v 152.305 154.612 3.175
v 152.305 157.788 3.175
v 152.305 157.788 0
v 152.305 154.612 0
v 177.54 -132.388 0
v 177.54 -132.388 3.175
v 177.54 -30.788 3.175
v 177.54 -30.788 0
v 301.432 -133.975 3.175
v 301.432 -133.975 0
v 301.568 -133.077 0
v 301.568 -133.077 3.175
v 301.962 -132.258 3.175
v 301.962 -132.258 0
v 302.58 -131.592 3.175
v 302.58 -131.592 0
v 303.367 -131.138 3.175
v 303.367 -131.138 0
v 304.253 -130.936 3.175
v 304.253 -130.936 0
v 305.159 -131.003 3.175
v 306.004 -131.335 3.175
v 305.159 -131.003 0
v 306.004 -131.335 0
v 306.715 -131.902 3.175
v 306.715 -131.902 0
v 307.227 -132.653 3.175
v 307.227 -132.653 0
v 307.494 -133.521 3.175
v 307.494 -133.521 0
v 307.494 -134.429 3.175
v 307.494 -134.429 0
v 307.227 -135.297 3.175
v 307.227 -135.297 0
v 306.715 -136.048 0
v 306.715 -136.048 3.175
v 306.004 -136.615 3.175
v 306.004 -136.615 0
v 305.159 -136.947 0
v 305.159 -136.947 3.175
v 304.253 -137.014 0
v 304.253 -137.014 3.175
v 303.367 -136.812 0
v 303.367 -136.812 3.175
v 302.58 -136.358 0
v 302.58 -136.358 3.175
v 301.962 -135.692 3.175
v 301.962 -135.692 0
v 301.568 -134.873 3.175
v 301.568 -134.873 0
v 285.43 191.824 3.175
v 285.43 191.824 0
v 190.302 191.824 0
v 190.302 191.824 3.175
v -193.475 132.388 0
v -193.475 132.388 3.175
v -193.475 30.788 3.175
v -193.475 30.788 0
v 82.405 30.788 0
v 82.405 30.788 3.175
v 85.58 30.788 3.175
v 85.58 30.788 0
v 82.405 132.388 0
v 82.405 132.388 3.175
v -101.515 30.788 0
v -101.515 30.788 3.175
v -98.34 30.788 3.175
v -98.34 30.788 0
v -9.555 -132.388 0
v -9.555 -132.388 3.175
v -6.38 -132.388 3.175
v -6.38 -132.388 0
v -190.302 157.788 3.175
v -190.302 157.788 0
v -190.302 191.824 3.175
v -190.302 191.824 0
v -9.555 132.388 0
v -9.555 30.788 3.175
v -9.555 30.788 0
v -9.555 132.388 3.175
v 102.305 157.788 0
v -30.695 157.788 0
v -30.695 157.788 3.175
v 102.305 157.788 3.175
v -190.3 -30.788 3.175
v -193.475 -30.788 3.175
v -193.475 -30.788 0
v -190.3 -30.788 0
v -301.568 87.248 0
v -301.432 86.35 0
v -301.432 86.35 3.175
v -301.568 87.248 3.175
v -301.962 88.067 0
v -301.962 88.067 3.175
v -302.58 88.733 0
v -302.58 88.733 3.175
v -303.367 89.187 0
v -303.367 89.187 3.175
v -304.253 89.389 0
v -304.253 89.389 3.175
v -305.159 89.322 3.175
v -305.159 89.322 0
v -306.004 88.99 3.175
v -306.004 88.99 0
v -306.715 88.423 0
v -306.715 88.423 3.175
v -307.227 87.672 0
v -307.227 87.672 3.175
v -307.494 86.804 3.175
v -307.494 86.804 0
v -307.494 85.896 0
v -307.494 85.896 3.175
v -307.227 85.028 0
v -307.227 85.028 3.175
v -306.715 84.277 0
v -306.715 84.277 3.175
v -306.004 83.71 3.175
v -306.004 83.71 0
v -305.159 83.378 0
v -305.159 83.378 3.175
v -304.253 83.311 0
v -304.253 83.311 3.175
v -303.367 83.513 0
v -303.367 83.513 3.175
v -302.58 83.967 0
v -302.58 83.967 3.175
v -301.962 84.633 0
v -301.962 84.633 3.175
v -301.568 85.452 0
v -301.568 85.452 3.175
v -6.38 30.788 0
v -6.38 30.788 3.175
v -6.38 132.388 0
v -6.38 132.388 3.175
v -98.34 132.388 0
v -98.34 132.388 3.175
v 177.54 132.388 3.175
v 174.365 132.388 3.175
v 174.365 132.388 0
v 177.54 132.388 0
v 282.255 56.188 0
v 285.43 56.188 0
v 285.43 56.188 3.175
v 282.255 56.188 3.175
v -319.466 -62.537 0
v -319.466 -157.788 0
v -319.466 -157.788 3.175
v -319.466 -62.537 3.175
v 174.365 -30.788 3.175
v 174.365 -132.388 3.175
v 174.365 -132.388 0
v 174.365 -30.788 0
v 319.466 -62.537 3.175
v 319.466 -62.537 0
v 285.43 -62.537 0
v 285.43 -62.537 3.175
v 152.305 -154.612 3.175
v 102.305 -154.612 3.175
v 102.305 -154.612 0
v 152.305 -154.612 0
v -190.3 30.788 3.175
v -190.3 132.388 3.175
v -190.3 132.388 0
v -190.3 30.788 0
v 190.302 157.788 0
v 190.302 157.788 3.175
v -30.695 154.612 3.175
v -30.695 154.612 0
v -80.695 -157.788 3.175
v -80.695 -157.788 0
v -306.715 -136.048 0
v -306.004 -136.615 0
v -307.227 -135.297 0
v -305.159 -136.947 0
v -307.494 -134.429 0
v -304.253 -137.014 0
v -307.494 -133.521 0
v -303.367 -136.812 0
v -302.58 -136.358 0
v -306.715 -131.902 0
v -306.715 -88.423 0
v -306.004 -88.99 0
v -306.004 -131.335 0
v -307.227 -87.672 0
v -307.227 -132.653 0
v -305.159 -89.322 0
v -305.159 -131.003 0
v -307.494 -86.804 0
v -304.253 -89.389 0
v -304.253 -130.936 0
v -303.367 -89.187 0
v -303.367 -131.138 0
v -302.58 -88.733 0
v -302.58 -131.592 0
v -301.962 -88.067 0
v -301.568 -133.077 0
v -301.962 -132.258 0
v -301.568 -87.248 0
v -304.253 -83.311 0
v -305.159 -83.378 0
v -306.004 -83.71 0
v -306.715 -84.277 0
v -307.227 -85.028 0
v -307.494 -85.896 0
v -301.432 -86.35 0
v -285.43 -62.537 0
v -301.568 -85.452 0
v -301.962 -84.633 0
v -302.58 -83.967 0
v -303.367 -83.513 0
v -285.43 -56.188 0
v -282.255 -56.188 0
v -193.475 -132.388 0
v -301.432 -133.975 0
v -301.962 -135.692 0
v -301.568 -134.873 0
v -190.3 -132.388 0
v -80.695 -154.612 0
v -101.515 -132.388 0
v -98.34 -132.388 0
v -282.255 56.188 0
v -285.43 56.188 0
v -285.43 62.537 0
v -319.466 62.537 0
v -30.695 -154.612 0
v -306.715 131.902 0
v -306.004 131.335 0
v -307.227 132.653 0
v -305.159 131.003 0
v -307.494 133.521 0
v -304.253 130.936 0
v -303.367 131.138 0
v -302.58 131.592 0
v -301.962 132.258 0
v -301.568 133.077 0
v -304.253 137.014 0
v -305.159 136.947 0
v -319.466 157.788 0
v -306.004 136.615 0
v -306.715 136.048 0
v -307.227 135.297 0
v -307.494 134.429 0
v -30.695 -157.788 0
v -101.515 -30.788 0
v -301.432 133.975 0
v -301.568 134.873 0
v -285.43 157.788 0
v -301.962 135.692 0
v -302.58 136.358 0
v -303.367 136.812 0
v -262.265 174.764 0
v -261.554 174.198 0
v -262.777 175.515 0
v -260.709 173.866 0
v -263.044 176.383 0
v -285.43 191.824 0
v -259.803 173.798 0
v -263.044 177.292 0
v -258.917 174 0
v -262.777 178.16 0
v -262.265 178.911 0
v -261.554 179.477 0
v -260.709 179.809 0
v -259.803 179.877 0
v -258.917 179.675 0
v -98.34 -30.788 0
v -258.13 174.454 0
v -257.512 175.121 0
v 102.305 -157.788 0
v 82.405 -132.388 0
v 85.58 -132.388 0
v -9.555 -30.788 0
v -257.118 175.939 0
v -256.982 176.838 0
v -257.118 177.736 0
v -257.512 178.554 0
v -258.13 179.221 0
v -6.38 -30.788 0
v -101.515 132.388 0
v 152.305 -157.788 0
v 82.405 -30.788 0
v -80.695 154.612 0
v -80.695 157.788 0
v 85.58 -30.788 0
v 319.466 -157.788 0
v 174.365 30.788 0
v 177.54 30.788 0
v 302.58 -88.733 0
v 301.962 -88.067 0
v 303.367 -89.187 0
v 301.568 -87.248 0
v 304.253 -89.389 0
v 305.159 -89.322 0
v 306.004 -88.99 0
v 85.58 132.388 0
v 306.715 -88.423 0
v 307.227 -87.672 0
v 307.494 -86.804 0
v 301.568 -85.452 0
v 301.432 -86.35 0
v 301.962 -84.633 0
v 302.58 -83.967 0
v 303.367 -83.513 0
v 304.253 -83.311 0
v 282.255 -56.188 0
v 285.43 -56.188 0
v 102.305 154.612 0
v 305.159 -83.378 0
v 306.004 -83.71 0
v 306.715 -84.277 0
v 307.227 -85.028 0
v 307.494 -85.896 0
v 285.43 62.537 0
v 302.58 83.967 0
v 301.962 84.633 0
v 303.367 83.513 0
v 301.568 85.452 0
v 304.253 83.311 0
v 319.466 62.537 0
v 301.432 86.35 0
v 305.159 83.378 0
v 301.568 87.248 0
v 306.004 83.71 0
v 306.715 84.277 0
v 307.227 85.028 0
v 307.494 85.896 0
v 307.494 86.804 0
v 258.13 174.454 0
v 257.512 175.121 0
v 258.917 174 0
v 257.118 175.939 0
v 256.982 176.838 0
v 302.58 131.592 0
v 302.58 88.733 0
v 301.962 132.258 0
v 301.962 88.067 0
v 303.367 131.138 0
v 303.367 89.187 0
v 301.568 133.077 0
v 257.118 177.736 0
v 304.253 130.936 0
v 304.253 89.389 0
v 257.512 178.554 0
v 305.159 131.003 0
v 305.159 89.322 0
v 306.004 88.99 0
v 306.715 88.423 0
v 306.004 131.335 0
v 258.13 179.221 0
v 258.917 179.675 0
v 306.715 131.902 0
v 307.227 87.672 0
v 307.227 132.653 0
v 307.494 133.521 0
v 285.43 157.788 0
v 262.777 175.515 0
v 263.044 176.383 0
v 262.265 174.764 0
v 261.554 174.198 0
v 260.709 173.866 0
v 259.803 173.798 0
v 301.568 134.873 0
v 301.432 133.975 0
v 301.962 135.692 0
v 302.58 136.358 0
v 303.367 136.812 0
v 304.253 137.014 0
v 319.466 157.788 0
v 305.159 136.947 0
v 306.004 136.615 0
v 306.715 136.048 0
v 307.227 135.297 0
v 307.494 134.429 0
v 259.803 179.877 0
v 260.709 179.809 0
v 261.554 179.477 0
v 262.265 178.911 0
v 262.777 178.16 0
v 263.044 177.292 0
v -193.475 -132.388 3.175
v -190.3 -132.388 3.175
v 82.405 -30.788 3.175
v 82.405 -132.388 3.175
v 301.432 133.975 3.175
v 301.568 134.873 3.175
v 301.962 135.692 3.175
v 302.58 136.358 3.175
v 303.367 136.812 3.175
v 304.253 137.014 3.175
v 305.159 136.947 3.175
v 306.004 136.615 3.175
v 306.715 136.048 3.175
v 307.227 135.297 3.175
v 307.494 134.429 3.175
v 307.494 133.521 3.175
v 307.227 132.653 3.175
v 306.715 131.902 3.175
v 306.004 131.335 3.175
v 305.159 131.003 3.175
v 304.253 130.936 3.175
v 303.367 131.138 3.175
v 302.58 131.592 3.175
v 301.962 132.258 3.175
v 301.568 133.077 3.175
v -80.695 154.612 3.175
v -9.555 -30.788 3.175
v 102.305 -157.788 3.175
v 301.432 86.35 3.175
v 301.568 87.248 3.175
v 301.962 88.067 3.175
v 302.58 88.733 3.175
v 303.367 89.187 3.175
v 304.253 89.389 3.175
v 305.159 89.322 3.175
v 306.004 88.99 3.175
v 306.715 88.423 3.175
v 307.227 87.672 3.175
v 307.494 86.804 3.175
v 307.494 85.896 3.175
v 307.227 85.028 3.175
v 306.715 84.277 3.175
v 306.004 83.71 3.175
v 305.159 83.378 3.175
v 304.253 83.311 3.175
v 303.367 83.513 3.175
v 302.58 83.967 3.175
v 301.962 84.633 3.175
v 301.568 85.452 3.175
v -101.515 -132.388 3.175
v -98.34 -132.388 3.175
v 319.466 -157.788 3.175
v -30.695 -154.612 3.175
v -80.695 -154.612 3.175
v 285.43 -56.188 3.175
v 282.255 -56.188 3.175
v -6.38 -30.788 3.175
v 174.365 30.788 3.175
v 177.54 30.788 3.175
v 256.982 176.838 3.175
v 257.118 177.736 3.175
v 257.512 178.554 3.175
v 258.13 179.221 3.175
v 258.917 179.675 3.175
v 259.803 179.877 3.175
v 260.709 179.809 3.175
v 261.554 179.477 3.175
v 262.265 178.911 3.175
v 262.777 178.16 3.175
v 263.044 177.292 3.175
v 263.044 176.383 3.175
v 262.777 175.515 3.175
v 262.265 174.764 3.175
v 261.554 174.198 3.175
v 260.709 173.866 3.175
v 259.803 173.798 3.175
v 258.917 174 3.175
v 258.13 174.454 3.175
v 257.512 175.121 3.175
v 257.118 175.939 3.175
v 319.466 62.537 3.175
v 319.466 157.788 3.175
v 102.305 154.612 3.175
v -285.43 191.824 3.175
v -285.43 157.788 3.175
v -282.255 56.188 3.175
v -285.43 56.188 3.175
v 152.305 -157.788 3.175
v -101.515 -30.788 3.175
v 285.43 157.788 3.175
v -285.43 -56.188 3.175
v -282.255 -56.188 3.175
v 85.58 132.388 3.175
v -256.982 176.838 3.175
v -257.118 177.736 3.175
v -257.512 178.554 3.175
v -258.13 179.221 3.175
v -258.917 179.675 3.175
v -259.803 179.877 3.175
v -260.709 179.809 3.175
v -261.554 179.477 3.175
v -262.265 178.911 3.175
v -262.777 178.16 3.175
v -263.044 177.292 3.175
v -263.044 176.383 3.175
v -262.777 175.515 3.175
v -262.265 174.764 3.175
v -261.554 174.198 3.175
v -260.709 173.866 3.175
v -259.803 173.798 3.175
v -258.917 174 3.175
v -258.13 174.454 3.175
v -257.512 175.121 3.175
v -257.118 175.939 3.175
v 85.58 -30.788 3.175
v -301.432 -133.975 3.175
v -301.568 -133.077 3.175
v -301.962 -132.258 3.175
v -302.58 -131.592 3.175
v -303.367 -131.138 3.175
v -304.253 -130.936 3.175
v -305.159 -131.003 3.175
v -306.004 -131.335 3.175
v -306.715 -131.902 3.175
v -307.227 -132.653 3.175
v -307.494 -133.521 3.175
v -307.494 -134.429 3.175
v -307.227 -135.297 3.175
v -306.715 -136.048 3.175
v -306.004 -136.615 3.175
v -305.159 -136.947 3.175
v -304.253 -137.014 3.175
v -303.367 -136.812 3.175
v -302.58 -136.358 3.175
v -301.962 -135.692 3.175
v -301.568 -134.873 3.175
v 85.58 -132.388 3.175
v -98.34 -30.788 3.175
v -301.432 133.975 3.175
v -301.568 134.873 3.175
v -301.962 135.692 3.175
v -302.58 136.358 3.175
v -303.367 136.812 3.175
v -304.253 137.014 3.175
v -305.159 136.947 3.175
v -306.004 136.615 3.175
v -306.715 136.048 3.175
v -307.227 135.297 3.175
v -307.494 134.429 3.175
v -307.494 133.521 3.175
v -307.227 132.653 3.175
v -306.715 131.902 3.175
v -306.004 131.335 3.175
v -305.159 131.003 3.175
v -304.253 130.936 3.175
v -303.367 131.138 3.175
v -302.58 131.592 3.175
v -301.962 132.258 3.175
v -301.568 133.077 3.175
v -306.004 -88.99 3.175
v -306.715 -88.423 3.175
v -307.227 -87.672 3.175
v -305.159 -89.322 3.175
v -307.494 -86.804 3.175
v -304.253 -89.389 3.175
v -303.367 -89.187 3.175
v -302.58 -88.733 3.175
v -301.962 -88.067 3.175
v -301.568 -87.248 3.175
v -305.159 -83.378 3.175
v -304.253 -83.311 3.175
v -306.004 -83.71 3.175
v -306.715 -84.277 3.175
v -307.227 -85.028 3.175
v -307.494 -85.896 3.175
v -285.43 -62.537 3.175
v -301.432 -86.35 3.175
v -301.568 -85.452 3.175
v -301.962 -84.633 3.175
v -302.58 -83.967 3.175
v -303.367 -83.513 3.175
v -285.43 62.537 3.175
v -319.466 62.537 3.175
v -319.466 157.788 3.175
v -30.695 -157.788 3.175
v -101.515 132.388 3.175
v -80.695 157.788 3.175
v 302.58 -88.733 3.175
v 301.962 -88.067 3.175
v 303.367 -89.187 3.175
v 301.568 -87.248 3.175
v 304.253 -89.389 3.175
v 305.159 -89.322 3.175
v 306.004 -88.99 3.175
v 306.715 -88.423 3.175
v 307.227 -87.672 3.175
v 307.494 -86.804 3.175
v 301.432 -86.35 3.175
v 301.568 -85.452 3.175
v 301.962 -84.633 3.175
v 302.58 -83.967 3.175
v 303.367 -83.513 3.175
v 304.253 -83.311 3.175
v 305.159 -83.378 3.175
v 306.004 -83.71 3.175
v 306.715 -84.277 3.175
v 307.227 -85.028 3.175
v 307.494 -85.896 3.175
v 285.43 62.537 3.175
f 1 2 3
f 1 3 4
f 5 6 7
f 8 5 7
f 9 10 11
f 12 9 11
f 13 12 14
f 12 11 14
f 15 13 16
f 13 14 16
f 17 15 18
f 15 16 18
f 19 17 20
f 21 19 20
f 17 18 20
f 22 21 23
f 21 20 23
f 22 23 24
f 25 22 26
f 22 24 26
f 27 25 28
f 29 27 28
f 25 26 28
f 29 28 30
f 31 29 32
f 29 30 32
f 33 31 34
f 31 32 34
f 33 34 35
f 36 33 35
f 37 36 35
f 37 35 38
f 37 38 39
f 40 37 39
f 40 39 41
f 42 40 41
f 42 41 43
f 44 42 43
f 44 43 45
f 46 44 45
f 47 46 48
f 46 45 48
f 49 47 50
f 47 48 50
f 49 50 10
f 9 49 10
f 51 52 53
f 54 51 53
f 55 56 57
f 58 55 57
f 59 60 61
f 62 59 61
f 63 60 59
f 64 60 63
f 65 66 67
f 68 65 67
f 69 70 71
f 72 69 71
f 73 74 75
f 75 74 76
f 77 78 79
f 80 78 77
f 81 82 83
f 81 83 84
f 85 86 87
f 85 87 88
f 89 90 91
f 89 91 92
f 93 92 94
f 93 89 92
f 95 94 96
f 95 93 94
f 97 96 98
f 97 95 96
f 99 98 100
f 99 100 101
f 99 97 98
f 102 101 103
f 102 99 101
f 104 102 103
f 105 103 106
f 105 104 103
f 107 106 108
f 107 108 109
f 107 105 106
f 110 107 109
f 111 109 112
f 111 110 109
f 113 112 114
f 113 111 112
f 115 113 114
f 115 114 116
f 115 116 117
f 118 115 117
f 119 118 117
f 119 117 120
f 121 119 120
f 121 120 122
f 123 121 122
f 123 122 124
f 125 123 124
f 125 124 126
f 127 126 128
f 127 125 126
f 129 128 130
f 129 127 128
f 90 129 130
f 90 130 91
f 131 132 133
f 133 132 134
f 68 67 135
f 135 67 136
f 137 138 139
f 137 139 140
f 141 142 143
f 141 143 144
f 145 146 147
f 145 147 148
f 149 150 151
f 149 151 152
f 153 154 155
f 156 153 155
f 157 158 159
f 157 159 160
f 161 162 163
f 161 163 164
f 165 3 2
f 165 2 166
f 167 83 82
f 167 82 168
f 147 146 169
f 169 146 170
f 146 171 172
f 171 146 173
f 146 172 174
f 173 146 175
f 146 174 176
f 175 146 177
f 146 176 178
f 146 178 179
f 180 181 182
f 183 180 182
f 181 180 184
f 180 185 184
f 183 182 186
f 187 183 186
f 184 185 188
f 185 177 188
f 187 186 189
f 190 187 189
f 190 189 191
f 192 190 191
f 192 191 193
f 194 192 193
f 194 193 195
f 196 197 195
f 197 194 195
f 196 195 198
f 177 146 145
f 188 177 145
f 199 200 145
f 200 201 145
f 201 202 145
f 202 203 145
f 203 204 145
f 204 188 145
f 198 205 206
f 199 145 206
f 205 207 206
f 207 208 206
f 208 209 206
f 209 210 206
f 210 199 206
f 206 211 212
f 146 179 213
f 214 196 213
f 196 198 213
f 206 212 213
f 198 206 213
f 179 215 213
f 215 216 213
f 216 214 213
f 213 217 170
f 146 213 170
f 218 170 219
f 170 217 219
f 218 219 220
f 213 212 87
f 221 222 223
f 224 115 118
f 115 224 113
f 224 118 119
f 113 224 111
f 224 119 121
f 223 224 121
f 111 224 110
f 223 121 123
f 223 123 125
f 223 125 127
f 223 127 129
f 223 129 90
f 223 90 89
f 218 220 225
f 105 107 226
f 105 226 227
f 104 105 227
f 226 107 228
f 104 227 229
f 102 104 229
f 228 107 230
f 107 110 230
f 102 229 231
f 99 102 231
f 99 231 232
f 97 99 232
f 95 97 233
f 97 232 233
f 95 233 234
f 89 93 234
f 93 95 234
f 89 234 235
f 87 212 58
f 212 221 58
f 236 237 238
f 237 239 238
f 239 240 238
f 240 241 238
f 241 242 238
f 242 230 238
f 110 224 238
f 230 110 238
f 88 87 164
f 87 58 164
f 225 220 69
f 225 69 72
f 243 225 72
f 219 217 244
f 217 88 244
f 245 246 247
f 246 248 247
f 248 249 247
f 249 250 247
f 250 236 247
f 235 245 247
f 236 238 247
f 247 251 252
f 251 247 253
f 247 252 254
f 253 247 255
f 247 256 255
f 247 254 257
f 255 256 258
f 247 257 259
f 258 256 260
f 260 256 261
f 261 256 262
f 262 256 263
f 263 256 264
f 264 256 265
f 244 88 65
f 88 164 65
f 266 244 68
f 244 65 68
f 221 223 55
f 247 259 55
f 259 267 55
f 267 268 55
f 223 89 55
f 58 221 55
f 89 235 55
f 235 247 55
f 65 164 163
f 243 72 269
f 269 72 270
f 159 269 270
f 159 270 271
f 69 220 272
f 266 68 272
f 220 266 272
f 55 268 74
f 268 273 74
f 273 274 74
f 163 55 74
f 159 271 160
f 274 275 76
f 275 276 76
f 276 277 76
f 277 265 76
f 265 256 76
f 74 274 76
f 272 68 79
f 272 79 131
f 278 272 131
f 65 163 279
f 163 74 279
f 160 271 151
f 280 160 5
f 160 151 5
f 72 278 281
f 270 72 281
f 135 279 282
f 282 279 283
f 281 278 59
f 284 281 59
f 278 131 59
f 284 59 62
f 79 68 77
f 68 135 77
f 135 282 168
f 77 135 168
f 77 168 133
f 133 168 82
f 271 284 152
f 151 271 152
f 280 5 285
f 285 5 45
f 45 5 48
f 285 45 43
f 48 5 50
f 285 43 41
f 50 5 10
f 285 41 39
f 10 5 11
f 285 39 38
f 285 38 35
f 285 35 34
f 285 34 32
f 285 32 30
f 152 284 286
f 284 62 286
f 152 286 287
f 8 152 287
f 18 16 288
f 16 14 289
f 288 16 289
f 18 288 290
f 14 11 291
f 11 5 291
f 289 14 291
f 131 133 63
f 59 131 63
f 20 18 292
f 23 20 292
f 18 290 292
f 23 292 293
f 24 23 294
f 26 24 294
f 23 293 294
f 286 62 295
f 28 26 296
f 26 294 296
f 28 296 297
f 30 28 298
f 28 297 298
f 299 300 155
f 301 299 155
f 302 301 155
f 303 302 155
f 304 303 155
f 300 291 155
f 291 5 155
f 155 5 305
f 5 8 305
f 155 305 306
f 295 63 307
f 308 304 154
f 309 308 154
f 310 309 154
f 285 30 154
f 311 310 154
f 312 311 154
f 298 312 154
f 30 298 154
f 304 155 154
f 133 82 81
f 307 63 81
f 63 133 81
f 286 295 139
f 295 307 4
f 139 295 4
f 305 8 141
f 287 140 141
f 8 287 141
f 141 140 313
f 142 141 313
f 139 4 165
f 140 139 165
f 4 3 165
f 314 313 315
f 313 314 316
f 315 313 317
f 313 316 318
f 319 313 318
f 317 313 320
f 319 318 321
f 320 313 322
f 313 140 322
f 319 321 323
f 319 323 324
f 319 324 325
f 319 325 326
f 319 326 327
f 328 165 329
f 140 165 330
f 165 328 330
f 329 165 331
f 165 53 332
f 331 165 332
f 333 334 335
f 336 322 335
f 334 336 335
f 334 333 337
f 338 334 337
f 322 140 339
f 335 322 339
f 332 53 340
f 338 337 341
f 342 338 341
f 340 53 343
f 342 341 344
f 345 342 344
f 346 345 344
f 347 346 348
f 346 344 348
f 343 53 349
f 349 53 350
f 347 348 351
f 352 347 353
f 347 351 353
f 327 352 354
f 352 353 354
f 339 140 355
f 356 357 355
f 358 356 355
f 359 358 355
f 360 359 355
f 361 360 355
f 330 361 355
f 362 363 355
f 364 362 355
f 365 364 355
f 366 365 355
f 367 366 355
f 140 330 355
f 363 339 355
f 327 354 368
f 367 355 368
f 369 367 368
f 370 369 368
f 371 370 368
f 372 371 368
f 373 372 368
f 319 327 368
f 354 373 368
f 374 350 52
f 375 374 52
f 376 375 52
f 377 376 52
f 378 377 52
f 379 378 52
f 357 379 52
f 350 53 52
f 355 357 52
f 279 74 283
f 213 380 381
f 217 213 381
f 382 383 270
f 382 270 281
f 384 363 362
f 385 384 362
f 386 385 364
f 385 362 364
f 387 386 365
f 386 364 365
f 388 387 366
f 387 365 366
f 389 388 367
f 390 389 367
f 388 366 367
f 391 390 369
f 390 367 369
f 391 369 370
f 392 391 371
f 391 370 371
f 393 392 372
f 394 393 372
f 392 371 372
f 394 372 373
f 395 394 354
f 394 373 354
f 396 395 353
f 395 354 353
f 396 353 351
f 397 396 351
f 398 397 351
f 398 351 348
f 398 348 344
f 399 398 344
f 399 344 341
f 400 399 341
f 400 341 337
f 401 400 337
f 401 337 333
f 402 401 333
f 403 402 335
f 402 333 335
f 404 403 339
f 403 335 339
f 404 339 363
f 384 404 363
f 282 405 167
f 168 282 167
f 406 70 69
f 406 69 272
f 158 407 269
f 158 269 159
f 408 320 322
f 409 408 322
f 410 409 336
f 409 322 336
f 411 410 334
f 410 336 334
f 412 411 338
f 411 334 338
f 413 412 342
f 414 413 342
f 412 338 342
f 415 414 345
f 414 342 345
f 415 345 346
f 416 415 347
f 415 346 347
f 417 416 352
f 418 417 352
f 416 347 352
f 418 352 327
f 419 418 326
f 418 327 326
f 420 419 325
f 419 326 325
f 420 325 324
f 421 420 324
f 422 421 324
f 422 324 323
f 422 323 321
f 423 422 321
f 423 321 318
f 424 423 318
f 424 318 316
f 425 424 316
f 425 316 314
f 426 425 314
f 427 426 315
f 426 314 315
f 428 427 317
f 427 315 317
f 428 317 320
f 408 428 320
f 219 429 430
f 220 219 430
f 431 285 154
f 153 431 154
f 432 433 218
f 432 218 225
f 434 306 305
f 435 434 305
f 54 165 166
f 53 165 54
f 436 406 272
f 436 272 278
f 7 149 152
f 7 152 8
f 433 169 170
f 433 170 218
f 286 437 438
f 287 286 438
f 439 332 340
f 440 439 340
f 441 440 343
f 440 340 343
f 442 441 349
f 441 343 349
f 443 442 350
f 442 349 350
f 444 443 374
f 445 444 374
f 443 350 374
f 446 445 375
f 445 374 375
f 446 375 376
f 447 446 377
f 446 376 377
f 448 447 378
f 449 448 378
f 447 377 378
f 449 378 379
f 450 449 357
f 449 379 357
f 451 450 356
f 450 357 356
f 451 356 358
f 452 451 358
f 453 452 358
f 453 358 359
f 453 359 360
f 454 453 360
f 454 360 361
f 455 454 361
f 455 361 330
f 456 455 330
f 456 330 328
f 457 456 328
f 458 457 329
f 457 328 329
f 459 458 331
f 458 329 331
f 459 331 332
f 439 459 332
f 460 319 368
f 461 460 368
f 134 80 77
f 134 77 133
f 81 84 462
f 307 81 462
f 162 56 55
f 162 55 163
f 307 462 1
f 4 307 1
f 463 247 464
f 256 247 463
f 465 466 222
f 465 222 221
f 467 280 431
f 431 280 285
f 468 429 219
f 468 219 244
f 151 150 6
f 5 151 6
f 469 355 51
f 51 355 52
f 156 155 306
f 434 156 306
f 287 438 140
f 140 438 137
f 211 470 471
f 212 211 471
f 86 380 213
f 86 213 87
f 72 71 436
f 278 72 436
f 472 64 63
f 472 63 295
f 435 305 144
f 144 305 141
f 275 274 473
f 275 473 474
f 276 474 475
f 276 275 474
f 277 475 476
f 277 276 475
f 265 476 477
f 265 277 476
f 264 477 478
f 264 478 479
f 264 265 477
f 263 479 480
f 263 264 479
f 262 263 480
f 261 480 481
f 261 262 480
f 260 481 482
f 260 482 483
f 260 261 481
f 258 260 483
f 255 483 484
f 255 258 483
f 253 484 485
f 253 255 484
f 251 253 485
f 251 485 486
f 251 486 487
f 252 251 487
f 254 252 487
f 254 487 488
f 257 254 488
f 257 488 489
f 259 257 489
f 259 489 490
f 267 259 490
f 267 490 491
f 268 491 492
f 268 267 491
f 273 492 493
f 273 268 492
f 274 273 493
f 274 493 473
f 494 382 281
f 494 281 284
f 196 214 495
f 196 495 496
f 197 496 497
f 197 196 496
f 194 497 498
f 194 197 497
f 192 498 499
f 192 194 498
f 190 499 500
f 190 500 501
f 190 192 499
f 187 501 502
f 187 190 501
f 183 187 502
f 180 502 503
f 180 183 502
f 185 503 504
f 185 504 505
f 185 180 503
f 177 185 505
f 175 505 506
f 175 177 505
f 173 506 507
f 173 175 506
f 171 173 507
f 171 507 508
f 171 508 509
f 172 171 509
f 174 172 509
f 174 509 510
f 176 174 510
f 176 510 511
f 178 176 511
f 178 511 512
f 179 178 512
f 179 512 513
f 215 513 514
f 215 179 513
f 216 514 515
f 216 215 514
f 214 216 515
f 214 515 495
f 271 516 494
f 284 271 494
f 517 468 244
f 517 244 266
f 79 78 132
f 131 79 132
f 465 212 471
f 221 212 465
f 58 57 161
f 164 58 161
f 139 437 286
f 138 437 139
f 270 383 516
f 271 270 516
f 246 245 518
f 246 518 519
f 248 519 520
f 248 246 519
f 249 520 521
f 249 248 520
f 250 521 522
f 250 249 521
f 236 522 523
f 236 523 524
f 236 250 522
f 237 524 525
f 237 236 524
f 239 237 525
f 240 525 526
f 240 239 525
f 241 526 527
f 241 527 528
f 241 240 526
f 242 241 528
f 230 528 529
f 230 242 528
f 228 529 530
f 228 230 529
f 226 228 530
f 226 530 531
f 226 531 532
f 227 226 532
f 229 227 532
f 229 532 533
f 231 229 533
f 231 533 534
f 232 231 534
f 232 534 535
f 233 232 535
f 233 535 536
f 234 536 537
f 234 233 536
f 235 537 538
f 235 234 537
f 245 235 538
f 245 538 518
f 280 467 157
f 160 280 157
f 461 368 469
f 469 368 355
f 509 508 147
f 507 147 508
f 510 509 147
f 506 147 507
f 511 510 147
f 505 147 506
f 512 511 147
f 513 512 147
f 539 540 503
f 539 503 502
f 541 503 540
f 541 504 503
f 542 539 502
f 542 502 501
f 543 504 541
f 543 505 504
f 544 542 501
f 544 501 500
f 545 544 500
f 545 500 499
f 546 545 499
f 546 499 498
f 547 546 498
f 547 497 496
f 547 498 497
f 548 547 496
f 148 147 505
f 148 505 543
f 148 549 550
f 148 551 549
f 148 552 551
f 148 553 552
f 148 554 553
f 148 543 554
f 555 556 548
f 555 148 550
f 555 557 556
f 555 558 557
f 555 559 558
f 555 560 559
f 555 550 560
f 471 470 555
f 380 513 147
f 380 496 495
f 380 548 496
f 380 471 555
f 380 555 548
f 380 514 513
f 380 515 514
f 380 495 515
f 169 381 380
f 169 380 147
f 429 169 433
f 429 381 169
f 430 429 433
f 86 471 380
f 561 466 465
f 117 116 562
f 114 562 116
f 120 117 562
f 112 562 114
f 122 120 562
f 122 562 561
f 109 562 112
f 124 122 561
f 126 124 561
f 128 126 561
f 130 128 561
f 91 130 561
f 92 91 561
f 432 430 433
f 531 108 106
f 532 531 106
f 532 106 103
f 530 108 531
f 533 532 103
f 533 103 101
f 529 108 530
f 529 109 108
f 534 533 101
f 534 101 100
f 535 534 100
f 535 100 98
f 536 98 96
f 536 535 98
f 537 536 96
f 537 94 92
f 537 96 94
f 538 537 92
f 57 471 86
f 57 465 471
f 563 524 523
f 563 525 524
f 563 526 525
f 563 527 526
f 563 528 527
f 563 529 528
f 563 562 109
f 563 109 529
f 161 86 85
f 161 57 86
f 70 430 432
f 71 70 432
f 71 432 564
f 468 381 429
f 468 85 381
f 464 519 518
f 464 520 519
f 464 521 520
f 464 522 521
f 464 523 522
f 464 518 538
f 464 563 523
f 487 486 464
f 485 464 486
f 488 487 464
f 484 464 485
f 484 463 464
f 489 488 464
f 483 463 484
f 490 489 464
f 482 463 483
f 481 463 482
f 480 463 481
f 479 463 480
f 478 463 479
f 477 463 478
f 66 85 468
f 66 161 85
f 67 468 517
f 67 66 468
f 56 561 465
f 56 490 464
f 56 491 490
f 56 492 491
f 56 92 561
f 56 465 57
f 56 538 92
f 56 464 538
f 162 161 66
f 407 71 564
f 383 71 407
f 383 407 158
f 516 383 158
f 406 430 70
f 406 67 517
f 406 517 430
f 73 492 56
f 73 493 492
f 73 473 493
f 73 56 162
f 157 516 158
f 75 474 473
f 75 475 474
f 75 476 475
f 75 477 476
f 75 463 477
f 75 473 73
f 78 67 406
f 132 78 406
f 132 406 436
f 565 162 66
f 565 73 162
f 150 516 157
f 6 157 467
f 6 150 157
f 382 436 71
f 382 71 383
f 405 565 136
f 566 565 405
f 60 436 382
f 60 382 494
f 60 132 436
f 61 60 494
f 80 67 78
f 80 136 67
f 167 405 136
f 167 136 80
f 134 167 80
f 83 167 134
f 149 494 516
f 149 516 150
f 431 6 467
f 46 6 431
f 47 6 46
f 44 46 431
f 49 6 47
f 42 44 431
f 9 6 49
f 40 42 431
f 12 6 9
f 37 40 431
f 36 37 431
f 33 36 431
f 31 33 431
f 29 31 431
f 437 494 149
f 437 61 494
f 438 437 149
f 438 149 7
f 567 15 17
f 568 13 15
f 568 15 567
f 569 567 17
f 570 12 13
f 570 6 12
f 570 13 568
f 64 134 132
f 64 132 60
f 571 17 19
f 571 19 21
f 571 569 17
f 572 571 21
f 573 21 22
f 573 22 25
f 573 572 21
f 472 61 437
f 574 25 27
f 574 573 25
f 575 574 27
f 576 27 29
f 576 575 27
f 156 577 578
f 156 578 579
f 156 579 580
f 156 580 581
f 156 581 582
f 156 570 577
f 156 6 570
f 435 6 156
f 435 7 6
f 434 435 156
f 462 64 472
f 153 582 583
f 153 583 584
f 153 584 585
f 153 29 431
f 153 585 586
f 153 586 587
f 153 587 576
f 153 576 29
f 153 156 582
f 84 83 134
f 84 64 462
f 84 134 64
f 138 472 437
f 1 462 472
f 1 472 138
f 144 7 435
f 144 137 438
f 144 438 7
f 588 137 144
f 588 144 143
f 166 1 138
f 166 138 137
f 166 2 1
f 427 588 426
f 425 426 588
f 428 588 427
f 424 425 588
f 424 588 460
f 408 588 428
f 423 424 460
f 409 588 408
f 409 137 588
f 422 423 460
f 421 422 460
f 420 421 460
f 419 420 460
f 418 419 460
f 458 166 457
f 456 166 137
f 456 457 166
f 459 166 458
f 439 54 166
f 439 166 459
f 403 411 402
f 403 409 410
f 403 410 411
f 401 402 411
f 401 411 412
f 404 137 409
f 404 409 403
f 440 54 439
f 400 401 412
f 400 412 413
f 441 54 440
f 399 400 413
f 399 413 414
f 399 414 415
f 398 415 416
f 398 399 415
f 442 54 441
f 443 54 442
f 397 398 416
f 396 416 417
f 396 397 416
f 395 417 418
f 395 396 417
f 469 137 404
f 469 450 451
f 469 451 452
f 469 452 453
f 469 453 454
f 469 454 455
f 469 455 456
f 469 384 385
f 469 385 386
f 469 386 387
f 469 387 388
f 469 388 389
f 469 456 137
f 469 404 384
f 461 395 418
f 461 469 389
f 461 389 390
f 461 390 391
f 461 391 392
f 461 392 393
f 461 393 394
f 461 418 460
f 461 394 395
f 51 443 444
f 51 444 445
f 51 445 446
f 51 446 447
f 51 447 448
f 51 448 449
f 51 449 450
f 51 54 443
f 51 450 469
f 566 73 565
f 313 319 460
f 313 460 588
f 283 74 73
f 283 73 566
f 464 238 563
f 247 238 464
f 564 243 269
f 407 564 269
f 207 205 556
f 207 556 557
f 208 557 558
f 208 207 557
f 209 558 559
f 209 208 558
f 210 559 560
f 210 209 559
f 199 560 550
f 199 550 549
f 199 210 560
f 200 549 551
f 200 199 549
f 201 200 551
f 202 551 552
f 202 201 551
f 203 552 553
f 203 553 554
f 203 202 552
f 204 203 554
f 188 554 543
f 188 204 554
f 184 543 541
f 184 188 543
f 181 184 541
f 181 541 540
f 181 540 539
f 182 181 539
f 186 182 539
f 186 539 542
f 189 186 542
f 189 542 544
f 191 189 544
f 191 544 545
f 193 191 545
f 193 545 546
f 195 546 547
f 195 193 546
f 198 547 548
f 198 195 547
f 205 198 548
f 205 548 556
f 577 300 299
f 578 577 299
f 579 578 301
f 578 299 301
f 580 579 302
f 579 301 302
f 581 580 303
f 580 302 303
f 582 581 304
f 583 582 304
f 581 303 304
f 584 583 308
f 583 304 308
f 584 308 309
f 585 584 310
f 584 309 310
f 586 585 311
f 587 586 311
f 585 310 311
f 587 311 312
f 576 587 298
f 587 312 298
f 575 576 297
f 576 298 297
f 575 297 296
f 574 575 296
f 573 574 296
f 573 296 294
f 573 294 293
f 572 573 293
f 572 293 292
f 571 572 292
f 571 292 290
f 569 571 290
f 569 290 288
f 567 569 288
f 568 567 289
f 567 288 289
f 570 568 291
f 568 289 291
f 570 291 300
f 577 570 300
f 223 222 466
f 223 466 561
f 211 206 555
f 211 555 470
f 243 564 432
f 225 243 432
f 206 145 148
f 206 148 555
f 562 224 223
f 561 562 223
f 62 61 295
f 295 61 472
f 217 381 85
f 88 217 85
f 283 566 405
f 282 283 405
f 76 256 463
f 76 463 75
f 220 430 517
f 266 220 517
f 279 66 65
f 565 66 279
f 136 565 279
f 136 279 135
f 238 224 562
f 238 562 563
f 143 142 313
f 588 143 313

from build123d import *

# Parameters (mm, degrees)
SKETCH1_W                 = 570.860988324
SKETCH1_H                 = 315.575
BOSS_EXTRUDE1_DEPTH       = 3.175
SKETCH2_W                 = 3.175
SKETCH2_H                 = 101.6
CUT_EXTRUDE1_DEPTH        = 3.175
SKETCH7_W                 = 50
SKETCH7_H                 = 3.175
CUT_EXTRUDE5_DEPTH        = 3.175
LPATTERN2_COUNT           = 5
LPATTERN2_PITCH           = 91.96
LPATTERN2_COPY_1_SKETCH_W = 3.175
LPATTERN2_COPY_1_SKETCH_H = 101.6
LPATTERN2_COPY_1_DEPTH    = 3.175
LPATTERN2_COPY_2_SKETCH_W = 3.175
LPATTERN2_COPY_2_SKETCH_H = 101.6
LPATTERN2_COPY_2_DEPTH    = 3.175
LPATTERN2_COPY_3_SKETCH_W = 3.175
LPATTERN2_COPY_3_SKETCH_H = 101.6
LPATTERN2_COPY_3_DEPTH    = 3.175
LPATTERN2_COPY_4_SKETCH_W = 3.175
LPATTERN2_COPY_4_SKETCH_H = 101.6
LPATTERN2_COPY_4_DEPTH    = 3.175
SKETCH9_W                 = 95.12808
SKETCH9_H                 = 34.036
SKETCH9_R                 = 3.048
SKETCH9_W_2               = 34.036
SKETCH9_H_2               = 95.25
BOSS_EXTRUDE3_DEPTH       = 3.175
SKETCH10_W                = 3.175
SKETCH10_H                = 112.375
CUT_EXTRUDE6_DEPTH        = 373.646181611


with BuildPart() as part:
    # Sketch1 → Boss-Extrude1 (new body)
    with BuildSketch(Plane.XY):
        Rectangle(SKETCH1_W, SKETCH1_H)
    extrude(amount=BOSS_EXTRUDE1_DEPTH)

    # Sketch2 → Cut-Extrude1 (cut)
    with BuildSketch(Plane.XY.offset(3.175)):
        with Locations((-191.887994162, -81.5875)):
            Rectangle(SKETCH2_W, SKETCH2_H)
    cut_extrude1 = extrude(amount=-CUT_EXTRUDE1_DEPTH, mode=Mode.SUBTRACT)

    # Sketch7 → Cut-Extrude5 (cut)
    with BuildSketch(Plane.XY.offset(3.175)):
        with Locations((127.304934912, -156.2)):
            Rectangle(SKETCH7_W, SKETCH7_H)
        with Locations((-55.695065088, -156.2)):
            Rectangle(SKETCH7_W, SKETCH7_H)
    cut_extrude5 = extrude(amount=-CUT_EXTRUDE5_DEPTH, mode=Mode.SUBTRACT)

    # Mirror3: Cut-Extrude1 across plane
    add(cut_extrude1.mirror(Plane.ZX), mode=Mode.SUBTRACT)

    # LPattern2: Cut-Extrude1 ×5
    with Locations(*[(i * LPATTERN2_PITCH, 0, 0) for i in range(1, LPATTERN2_COUNT)]):
        add(cut_extrude1, mode=Mode.SUBTRACT)

    # LPattern2 copy 1 sketch → LPattern2 copy 1 (cut)
    with BuildSketch(Plane(origin=(91.96, 0, 3.175), x_dir=(1, 0, 0), z_dir=(0, 0, 1))):
        with Locations((-191.887994162, 81.5875)):
            Rectangle(LPATTERN2_COPY_1_SKETCH_W, LPATTERN2_COPY_1_SKETCH_H)
    extrude(amount=-LPATTERN2_COPY_1_DEPTH, mode=Mode.SUBTRACT)

    # LPattern2 copy 2 sketch → LPattern2 copy 2 (cut)
    with BuildSketch(Plane(origin=(183.92, 0, 3.175), x_dir=(1, 0, 0), z_dir=(0, 0, 1))):
        with Locations((-191.887994162, 81.5875)):
            Rectangle(LPATTERN2_COPY_2_SKETCH_W, LPATTERN2_COPY_2_SKETCH_H)
    extrude(amount=-LPATTERN2_COPY_2_DEPTH, mode=Mode.SUBTRACT)

    # LPattern2 copy 3 sketch → LPattern2 copy 3 (cut)
    with BuildSketch(Plane(origin=(275.88, 0, 3.175), x_dir=(1, 0, 0), z_dir=(0, 0, 1))):
        with Locations((-191.887994162, 81.5875)):
            Rectangle(LPATTERN2_COPY_3_SKETCH_W, LPATTERN2_COPY_3_SKETCH_H)
    extrude(amount=-LPATTERN2_COPY_3_DEPTH, mode=Mode.SUBTRACT)

    # LPattern2 copy 4 sketch → LPattern2 copy 4 (cut)
    with BuildSketch(Plane(origin=(367.84, 0, 3.175), x_dir=(1, 0, 0), z_dir=(0, 0, 1))):
        with Locations((-191.887994162, 81.5875)):
            Rectangle(LPATTERN2_COPY_4_SKETCH_W, LPATTERN2_COPY_4_SKETCH_H)
    extrude(amount=-LPATTERN2_COPY_4_DEPTH, mode=Mode.SUBTRACT)

    # Sketch9 → Boss-Extrude3 (add)
    # profile 1 of 3: a face of its own
    with BuildSketch(Plane(origin=(0, 0, 0), x_dir=(-1, 0, 0), z_dir=(0, 0, -1))):
        with Locations((-237.866454162, 174.8055)):
            Rectangle(SKETCH9_W, SKETCH9_H)
        with Locations((-260.030494162, 176.8375)):
            Circle(SKETCH9_R, mode=Mode.SUBTRACT)
    # profile 2 of 3: a face of its own
    with BuildSketch(Plane(origin=(0, 0, 0), x_dir=(-1, 0, 0), z_dir=(0, 0, -1))):
        with Locations((-302.448494162, 110.1625)):
            Rectangle(SKETCH9_W_2, SKETCH9_H_2)
        with Locations((-304.480494162, 86.35)):
            Circle(SKETCH9_R, mode=Mode.SUBTRACT)
        with Locations((-304.480494162, 133.975)):
            Circle(SKETCH9_R, mode=Mode.SUBTRACT)
    # profile 3 of 3: a face of its own
    with BuildSketch(Plane(origin=(0, 0, 0), x_dir=(-1, 0, 0), z_dir=(0, 0, -1))):
        with Locations((-302.448494162, -110.1625)):
            Rectangle(SKETCH9_W_2, SKETCH9_H_2)
        with Locations((-304.480494162, -133.975)):
            Circle(SKETCH9_R, mode=Mode.SUBTRACT)
        with Locations((-304.480494162, -86.35)):
            Circle(SKETCH9_R, mode=Mode.SUBTRACT)
    boss_extrude3 = extrude(amount=-BOSS_EXTRUDE3_DEPTH)

    # Mirror4: Boss-Extrude3 across plane
    add(boss_extrude3.mirror(Plane(origin=(0, 0, 0), x_dir=(0, 0, 1), z_dir=(1, 0, 0))))

    # Mirror5: Cut-Extrude5 across plane
    add(cut_extrude5.mirror(Plane.ZX), mode=Mode.SUBTRACT)

    # Sketch10 → Cut-Extrude6 (cut, through all)
    with BuildSketch(Plane(origin=(0, 0, 0), x_dir=(-1, 0, 0), z_dir=(0, 0, -1))):
        with Locations((-283.842994162, 0)):
            Rectangle(SKETCH10_W, SKETCH10_H)
    cut_extrude6 = extrude(amount=-CUT_EXTRUDE6_DEPTH, mode=Mode.SUBTRACT)

    # Mirror6: Cut-Extrude6 across plane
    add(cut_extrude6.mirror(Plane(origin=(0, 0, 0), x_dir=(0, 0, 1), z_dir=(1, 0, 0))), mode=Mode.SUBTRACT)


solid = part.part
